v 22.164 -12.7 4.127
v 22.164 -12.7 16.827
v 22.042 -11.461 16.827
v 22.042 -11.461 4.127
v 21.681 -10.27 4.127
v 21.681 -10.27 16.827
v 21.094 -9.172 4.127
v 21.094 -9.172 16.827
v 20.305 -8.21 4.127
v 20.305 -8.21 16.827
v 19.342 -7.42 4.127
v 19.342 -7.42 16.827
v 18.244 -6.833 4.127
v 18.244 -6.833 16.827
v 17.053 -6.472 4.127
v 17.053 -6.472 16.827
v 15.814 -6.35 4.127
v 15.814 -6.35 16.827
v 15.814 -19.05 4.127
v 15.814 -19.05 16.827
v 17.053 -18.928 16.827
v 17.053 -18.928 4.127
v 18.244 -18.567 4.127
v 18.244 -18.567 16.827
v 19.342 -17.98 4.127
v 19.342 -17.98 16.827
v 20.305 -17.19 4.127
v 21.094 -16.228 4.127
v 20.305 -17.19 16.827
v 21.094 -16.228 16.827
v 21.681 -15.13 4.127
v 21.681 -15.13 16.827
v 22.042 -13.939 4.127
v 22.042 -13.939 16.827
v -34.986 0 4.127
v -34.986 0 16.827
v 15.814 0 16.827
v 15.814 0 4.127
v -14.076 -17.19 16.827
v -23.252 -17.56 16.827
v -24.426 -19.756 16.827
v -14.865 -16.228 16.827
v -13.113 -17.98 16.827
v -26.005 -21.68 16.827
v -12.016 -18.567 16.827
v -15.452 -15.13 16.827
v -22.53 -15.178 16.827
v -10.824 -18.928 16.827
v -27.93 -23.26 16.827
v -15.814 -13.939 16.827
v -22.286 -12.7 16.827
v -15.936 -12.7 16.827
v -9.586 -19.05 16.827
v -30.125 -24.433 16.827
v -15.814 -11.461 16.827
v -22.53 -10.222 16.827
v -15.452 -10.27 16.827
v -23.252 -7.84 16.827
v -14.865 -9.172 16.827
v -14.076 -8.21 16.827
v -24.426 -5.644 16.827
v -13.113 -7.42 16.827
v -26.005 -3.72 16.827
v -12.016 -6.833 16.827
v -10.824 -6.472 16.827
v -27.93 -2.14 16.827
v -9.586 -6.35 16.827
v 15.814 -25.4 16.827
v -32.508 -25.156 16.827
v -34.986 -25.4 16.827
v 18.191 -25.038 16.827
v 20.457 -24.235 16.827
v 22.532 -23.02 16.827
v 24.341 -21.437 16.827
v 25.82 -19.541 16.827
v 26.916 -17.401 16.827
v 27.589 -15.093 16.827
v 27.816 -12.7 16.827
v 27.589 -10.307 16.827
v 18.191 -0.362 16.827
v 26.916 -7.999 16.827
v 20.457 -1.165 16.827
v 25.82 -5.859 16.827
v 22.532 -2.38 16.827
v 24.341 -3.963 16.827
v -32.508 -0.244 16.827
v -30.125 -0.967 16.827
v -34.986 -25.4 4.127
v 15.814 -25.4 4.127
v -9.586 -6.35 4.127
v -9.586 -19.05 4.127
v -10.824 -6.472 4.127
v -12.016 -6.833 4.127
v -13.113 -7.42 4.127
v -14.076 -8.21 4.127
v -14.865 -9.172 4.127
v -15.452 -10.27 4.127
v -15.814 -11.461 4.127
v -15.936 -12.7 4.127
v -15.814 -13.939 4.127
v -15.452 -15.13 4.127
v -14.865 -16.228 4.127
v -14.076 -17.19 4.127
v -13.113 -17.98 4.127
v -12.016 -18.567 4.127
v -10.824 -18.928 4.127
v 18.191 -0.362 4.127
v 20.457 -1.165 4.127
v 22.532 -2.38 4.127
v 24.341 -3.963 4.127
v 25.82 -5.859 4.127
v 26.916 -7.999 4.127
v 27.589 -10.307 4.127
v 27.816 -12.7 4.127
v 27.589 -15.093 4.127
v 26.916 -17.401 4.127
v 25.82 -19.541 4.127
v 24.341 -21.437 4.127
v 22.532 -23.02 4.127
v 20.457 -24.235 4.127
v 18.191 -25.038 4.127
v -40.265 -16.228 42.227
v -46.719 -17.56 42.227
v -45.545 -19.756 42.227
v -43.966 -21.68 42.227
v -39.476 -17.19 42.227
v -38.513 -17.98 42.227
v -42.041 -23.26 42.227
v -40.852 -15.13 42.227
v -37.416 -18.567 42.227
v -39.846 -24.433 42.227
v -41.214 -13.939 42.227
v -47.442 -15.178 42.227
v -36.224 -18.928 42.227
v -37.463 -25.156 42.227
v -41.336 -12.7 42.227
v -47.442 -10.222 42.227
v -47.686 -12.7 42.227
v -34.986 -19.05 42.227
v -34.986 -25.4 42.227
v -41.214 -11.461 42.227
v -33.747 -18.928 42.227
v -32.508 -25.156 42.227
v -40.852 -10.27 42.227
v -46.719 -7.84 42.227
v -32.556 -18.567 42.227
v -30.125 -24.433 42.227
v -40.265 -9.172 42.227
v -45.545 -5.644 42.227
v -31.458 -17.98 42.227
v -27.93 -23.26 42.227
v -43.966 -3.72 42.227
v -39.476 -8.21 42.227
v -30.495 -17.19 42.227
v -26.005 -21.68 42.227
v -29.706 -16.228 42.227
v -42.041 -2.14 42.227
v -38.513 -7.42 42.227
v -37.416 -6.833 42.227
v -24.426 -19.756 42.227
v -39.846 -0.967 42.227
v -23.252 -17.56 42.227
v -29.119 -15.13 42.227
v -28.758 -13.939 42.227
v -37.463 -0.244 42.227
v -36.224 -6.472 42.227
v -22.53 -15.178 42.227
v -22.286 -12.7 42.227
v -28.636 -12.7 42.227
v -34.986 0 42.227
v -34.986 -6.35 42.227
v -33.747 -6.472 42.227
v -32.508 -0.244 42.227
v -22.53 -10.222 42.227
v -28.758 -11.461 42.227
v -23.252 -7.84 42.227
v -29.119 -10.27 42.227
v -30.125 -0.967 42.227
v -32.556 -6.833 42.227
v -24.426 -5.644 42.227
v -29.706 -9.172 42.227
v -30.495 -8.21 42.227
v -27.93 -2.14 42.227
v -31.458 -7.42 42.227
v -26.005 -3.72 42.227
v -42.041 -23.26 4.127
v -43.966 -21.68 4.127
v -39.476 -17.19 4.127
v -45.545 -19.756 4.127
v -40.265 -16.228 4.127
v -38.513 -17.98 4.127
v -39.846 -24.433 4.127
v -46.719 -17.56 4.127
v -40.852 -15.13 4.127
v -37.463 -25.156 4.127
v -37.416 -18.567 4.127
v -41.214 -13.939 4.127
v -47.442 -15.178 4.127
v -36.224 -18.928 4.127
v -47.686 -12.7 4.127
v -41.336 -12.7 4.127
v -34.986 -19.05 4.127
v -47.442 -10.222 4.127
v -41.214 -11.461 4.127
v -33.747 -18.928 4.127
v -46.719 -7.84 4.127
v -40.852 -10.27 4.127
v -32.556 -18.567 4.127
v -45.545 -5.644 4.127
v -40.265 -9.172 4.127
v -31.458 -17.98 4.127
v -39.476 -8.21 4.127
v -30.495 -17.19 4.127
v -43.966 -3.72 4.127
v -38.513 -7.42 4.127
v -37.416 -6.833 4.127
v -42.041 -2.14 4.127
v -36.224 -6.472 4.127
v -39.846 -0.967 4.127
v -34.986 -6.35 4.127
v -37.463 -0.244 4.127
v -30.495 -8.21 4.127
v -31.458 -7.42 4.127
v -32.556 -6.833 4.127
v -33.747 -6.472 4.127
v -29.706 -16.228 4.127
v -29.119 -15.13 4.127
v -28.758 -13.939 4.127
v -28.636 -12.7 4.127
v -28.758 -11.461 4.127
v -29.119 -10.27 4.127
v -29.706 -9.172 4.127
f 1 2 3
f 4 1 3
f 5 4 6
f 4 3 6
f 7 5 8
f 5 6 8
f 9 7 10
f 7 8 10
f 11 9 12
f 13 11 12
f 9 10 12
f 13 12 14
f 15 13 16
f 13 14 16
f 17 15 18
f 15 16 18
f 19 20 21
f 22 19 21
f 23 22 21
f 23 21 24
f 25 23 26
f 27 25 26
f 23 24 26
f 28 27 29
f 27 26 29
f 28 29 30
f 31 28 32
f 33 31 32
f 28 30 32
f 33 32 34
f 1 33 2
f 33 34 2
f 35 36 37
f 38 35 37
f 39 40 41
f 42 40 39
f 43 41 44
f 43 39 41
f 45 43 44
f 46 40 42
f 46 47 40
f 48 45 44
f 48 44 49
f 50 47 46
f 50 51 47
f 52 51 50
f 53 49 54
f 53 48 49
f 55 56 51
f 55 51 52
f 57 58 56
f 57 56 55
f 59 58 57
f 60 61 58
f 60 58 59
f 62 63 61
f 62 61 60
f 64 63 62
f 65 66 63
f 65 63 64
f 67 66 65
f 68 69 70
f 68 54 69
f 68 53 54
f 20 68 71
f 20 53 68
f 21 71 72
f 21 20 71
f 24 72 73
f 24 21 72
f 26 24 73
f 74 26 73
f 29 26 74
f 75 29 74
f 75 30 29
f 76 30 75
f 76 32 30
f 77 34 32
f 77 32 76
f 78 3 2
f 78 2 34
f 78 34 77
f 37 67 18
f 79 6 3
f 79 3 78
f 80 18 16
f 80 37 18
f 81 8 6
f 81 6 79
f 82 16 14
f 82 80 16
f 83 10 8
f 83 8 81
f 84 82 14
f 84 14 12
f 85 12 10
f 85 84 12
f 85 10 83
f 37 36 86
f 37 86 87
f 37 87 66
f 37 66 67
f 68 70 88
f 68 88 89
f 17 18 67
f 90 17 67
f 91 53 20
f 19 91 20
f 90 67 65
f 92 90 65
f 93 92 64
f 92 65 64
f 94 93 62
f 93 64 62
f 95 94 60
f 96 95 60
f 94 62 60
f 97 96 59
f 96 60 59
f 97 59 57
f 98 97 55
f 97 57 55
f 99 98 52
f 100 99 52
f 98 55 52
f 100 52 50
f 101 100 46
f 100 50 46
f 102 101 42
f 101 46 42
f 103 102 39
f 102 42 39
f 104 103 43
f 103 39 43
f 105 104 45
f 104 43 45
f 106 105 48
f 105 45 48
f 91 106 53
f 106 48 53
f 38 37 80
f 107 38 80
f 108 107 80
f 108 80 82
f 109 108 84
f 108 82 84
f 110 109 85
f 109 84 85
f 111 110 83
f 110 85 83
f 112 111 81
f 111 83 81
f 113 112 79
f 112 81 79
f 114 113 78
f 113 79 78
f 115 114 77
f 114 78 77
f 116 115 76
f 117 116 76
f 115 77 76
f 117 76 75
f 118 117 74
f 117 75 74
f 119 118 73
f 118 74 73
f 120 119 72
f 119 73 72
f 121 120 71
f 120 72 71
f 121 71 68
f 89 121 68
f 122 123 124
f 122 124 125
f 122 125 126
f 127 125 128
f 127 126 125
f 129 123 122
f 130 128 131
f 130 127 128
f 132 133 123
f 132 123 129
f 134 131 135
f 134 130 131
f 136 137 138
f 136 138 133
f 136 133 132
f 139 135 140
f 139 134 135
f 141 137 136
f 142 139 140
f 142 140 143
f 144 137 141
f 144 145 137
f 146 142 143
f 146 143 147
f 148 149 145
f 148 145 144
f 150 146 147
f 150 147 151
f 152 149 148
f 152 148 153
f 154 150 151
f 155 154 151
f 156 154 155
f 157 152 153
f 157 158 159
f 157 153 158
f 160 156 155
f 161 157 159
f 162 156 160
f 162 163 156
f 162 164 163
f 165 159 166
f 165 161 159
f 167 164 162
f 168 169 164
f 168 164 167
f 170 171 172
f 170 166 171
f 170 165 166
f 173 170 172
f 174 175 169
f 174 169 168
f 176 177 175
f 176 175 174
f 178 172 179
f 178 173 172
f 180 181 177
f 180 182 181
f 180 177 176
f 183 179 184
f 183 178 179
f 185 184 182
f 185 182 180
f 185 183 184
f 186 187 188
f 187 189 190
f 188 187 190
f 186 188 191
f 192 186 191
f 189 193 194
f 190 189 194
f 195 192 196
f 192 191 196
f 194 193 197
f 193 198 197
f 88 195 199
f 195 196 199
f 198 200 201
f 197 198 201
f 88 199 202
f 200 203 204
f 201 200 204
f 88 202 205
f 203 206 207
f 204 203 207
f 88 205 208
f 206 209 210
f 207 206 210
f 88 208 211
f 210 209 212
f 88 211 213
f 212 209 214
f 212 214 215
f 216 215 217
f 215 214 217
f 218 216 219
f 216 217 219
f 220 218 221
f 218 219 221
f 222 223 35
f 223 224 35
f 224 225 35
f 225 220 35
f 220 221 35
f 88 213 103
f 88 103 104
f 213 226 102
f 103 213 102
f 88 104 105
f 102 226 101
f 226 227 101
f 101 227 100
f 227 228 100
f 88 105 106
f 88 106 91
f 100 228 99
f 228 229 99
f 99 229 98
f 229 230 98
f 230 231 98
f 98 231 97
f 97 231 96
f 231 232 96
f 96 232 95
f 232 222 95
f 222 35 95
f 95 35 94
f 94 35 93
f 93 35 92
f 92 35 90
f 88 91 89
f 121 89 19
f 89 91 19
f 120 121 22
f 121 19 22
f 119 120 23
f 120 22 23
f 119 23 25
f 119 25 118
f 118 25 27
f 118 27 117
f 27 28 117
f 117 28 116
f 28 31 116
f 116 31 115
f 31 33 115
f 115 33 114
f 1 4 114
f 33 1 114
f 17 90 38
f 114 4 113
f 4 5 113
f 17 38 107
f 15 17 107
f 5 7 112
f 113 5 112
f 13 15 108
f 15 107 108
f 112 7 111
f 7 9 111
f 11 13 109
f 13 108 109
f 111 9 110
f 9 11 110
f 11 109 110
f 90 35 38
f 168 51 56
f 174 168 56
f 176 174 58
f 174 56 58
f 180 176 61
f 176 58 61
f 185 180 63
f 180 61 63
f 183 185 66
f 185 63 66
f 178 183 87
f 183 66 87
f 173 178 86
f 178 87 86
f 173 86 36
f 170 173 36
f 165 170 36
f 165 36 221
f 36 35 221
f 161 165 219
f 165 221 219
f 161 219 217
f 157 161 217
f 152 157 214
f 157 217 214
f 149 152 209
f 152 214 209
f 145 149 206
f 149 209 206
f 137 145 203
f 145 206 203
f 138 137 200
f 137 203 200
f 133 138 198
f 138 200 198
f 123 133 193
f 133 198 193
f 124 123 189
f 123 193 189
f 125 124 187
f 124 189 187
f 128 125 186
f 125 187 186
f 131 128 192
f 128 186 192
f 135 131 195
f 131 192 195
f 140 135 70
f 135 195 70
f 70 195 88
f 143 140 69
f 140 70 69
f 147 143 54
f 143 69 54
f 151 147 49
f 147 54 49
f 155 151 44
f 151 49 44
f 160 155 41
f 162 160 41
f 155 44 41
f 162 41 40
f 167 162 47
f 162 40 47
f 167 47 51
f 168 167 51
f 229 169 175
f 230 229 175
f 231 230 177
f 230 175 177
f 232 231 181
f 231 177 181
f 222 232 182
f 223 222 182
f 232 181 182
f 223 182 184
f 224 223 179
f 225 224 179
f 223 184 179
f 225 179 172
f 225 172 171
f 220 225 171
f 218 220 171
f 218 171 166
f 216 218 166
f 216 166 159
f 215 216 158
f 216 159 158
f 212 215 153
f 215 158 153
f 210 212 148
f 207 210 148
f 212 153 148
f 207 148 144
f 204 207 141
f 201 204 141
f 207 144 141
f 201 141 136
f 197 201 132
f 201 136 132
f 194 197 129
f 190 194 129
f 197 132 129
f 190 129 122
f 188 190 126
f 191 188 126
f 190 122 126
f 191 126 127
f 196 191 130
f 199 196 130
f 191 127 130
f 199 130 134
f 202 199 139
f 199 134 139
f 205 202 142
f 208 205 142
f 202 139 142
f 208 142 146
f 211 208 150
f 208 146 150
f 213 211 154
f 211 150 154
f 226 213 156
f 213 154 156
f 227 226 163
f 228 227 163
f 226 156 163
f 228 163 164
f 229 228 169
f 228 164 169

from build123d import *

# Parameters (mm, degrees)
F0_W     = 76.2
F0_H     = 12.7
F1_DEPTH = 25.4
F2_R     = 12.7
F3_DEPTH = 25.4
F4_DEPTH = 12.7
F5_R     = 6.35
F6_DEPTH = 38.1
F8_DEPTH = 12.7


with BuildPart() as f1:
    # F0 (on Front) → F1 (new body)
    with BuildSketch(Plane.XZ):
        with Locations((-9.585544682, 10.4771234242)):
            Rectangle(F0_W, F0_H)
    extrude(amount=F1_DEPTH)

    # F2 (on face) → F3 (join)
    with BuildSketch(Plane.XY.offset(16.8271234242)):
        with Locations((-34.985544682, -12.7)):
            Circle(F2_R)
    extrude(amount=F3_DEPTH)

    # F4 (cut): faces of the model
    f4_faces = [f1.faces().sort_by_distance(p)[0] for p in [
        (-44.8487718574, -2.8367728246, 16.8271234242),
        (-44.8487718574, -22.5632271754, 16.8271234242),
    ]]
    extrude(f4_faces, amount=-F4_DEPTH, mode=Mode.SUBTRACT)

    # F5 (on face) → F6 (cut)
    with BuildSketch(Plane.XY.offset(42.2271234242)):
        with Locations((-34.985544682, -12.7)):
            Circle(F5_R)
    extrude(amount=-F6_DEPTH, mode=Mode.SUBTRACT)

    # F7 (on face) → F8 (cut)
    with BuildSketch(Plane.XY.offset(16.8271234242)):
        with BuildLine():
            ThreePointArc((-9.585544682, -19.05), (-5.0954166214, -17.1901280605), (-3.235544682, -12.7))
            ThreePointArc((-3.235544682, -12.7), (-5.0954166214, -8.2098719395), (-9.585544682, -6.35))
            ThreePointArc((-9.585544682, -6.35), (-15.935544682, -12.7), (-9.585544682, -19.05))
        make_face()
        with BuildLine():
            ThreePointArc((-9.585544682, -6.35), (-5.0954166214, -8.2098719395), (-3.235544682, -12.7))
            ThreePointArc((-3.235544682, -12.7), (-5.0954166214, -17.1901280605), (-9.585544682, -19.05))
            Line((-9.585544682, -19.05), (15.814455318, -19.05))
            ThreePointArc((15.814455318, -19.05), (9.464455318, -12.7), (15.814455318, -6.35))
            Line((15.814455318, -6.35), (-9.585544682, -6.35))
        make_face()
        with BuildLine():
            ThreePointArc((22.164455318, -12.7), (20.3045833786, -8.2098719395), (15.814455318, -6.35))
            ThreePointArc((15.814455318, -6.35), (9.464455318, -12.7), (15.814455318, -19.05))
            ThreePointArc((15.814455318, -19.05), (20.3045833786, -17.1901280605), (22.164455318, -12.7))
        make_face()
        with BuildLine():
            ThreePointArc((15.814455318, 0), (27.816257265, -12.7), (15.814455318, -25.4))
            Line((15.814455318, -25.4), (28.514455318, -25.4))
            Line((28.514455318, -25.4), (28.514455318, 0))
            Line((28.514455318, 0), (15.814455318, 0))
        make_face()
    extrude(amount=-F8_DEPTH, mode=Mode.SUBTRACT)


solid = f1.part
